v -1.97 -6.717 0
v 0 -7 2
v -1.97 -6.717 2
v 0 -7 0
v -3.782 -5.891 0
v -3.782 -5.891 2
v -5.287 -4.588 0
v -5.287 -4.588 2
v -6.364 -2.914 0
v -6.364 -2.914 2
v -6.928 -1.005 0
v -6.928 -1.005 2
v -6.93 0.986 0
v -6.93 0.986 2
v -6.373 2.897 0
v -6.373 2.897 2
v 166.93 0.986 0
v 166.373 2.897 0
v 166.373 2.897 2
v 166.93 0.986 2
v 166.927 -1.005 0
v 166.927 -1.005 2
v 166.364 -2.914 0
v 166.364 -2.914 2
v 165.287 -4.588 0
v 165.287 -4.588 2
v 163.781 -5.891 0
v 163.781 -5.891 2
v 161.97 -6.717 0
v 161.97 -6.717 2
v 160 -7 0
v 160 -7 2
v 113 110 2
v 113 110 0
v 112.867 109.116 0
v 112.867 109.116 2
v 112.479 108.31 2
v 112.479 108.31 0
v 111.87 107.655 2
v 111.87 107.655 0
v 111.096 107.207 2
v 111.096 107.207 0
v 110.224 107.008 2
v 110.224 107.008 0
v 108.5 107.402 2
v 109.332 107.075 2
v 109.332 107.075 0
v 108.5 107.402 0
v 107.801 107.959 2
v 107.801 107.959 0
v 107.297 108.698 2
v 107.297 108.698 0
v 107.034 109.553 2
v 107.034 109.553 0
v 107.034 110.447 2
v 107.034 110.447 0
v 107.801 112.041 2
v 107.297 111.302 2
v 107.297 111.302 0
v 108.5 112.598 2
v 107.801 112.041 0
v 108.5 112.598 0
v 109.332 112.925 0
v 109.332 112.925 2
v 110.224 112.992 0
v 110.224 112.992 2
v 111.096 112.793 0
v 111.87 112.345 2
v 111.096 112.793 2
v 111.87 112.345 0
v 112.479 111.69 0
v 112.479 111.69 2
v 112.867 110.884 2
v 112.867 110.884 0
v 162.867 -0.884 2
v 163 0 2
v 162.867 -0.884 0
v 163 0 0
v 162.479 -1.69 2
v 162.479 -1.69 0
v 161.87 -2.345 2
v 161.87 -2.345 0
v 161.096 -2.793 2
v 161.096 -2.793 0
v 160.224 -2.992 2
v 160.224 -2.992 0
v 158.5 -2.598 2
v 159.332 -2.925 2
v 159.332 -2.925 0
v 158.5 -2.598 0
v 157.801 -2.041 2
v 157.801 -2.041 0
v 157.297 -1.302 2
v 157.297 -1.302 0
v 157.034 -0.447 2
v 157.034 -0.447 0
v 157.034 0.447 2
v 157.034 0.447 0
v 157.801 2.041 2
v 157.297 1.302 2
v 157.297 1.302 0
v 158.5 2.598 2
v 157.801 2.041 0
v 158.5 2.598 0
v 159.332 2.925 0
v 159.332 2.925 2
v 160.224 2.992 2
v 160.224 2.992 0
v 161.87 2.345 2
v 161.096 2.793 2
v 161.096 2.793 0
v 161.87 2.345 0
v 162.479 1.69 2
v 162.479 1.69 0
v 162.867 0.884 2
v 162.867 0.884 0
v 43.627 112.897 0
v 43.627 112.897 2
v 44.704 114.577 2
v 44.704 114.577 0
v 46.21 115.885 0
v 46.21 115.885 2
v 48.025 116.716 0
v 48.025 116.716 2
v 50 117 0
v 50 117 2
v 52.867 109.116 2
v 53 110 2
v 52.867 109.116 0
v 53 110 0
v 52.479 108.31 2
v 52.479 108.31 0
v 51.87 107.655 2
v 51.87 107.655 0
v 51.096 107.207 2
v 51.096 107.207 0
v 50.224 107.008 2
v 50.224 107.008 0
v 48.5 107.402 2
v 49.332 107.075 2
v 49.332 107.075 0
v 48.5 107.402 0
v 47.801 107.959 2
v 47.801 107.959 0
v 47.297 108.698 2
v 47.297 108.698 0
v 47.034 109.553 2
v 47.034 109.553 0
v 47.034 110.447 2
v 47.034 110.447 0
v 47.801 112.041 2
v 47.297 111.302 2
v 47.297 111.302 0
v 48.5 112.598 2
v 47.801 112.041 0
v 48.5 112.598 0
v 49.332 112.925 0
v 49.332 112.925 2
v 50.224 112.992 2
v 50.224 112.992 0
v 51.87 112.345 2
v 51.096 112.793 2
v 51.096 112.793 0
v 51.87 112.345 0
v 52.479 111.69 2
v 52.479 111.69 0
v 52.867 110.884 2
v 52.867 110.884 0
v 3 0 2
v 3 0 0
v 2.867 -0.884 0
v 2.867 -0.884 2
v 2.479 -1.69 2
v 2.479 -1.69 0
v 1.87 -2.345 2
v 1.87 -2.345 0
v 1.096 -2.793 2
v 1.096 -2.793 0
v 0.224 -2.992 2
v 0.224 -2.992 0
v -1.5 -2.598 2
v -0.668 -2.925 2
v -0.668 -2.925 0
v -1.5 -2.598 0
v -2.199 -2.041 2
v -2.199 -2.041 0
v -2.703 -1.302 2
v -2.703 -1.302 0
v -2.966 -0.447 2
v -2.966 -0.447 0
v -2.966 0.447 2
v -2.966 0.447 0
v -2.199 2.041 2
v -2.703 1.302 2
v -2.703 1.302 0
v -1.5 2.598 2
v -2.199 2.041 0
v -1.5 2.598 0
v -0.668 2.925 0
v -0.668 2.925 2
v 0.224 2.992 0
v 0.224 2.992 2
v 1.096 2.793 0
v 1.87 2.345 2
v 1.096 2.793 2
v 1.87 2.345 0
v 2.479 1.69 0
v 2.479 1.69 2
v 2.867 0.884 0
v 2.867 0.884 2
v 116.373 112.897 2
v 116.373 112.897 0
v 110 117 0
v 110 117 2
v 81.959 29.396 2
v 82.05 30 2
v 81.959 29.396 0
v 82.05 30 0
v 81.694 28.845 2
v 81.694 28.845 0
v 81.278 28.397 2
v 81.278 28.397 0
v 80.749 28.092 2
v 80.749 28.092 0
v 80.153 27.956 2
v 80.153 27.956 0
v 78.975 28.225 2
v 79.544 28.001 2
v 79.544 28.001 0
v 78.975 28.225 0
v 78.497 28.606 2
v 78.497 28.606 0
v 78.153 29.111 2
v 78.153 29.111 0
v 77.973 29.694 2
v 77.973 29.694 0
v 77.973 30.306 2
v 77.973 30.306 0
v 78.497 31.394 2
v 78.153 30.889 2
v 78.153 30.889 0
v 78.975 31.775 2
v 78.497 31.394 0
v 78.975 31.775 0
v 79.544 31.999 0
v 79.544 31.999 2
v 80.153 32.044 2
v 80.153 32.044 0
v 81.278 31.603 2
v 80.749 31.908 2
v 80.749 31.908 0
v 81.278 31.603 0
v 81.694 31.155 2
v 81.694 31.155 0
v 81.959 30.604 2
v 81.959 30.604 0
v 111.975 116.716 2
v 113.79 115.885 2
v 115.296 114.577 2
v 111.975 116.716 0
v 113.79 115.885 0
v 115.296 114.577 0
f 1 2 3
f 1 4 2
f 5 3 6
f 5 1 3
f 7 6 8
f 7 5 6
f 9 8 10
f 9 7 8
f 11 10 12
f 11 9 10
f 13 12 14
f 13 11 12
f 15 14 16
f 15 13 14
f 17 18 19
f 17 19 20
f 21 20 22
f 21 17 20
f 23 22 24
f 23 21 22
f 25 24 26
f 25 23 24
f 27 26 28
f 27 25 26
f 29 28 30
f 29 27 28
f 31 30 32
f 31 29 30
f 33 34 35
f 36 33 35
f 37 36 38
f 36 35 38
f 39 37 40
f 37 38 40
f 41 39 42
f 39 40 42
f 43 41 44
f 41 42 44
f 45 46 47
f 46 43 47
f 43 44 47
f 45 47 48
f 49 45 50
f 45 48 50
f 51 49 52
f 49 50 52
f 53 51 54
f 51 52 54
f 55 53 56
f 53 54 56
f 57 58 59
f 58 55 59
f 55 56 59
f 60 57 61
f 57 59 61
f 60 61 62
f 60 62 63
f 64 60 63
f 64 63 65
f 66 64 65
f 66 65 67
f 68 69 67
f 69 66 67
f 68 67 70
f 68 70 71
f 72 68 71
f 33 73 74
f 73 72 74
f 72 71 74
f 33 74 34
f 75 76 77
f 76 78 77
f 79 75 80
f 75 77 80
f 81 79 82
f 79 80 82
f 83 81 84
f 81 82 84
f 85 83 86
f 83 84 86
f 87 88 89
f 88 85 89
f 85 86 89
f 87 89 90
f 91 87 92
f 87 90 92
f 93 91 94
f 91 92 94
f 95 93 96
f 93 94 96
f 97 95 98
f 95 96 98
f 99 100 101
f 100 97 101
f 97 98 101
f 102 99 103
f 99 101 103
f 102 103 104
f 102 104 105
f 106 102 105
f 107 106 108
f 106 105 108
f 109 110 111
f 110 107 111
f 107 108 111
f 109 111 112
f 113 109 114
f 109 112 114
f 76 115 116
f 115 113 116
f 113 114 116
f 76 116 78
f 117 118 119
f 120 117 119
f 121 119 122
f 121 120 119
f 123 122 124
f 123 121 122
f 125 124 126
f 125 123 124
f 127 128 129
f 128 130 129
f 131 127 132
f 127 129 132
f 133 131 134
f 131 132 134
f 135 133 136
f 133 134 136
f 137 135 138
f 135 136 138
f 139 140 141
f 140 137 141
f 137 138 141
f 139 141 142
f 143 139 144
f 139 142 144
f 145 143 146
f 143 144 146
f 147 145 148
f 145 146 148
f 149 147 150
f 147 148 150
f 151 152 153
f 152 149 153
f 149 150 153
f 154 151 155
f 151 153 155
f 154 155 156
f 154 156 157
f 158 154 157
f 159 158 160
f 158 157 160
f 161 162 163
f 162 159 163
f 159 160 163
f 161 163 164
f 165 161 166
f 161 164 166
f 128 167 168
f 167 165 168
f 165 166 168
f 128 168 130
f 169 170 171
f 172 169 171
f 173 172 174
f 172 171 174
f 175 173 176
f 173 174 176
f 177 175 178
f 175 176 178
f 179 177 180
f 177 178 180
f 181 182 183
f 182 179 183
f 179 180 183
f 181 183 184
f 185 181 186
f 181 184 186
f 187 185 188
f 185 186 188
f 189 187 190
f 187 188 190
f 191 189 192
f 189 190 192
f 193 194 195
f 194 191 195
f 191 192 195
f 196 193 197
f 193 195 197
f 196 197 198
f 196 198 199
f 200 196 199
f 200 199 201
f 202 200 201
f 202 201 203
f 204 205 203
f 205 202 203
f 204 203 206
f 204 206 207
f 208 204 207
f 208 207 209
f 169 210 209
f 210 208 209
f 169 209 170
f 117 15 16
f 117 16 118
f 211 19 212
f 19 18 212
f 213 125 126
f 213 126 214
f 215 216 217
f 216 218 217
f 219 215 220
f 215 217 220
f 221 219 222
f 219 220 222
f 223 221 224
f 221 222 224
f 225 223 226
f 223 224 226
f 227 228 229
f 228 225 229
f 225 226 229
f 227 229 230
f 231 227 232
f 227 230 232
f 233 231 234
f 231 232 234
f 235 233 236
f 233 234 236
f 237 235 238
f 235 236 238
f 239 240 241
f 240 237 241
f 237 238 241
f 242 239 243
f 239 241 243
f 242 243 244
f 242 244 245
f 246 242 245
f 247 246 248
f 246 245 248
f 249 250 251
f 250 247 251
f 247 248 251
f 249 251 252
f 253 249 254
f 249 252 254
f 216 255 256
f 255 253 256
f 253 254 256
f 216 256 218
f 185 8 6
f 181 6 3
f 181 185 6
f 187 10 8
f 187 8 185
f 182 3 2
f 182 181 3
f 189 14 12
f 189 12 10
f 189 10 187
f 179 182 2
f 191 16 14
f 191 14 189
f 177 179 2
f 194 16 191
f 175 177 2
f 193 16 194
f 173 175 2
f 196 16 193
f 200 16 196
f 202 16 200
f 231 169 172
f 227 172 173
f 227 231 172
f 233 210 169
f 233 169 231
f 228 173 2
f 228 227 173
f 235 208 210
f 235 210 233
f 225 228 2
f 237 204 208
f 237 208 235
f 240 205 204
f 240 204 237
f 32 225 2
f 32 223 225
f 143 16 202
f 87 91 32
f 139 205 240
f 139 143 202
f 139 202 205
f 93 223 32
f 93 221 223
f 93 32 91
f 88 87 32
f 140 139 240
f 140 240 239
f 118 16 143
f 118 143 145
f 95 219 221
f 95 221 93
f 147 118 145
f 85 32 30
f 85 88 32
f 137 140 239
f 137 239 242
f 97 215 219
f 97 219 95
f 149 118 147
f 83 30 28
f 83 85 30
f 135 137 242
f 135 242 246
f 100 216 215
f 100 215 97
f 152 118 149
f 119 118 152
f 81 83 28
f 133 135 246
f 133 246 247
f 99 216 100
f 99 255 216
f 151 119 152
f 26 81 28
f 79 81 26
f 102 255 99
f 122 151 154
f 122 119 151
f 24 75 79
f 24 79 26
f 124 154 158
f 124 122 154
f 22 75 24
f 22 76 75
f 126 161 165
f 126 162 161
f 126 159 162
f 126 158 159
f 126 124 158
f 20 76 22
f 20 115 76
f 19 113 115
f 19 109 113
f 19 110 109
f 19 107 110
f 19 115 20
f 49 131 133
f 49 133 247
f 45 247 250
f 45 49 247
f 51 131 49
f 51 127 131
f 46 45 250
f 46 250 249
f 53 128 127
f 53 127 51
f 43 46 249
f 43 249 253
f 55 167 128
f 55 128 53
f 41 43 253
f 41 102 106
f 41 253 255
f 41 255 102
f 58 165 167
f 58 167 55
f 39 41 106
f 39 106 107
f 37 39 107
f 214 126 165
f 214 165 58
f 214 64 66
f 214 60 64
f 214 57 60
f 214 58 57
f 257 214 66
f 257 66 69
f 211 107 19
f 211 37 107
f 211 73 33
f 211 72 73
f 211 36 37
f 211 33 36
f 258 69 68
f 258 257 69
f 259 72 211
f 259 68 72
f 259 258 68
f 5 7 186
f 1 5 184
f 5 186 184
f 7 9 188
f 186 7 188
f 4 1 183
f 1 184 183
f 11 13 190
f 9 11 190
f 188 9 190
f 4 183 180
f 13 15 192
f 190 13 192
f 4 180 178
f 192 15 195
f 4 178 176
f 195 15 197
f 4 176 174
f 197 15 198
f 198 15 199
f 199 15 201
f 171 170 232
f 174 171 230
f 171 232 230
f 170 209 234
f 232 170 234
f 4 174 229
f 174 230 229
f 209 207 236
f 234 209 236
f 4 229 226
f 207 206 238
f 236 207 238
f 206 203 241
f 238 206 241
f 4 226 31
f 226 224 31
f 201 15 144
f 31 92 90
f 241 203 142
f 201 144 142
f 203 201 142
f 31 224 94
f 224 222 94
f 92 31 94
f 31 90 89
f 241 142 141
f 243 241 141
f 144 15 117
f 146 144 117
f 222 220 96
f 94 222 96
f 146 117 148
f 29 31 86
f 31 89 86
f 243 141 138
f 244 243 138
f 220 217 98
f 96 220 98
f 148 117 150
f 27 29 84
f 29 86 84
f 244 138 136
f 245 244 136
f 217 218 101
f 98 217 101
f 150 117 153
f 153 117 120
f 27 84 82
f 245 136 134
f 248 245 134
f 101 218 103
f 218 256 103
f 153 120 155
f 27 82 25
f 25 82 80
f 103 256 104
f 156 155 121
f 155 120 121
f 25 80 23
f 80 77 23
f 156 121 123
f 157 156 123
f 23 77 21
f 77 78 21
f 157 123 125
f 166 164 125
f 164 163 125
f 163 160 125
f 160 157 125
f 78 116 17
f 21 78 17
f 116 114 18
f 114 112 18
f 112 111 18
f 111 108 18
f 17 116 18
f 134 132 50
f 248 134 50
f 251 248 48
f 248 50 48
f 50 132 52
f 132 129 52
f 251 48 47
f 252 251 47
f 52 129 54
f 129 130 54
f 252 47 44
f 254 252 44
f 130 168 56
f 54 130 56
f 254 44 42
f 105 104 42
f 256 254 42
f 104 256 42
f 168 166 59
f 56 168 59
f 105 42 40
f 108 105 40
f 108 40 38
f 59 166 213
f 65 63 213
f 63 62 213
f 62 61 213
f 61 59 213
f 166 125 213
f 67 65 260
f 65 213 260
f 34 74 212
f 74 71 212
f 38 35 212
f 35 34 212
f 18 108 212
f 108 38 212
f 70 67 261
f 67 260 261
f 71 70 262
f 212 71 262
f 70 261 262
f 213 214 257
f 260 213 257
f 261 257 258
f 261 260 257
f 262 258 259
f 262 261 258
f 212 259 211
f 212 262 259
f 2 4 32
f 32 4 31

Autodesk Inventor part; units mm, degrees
ref_plane "YZ Plane" through (0, 0, 0) normal (1, 0, 0) x (0, 1, 0)
ref_plane "XZ Plane" through (0, 0, 0) normal (0, 1, 0) x (-1, 0, 0)
ref_plane "XY Plane" through (0, 0, 0) normal (0, 0, 1) x (1, 0, 0)
sketch "Sketch1" plane through (0, 0, 0) normal (0, 0, 1) x (1, 0, 0)
  circle A0 centre (50, 110) radius 3
  circle A1 centre (0, 0) radius 3
  circle A2 centre (160, 0) radius 3
  circle A3 centre (80, 30) radius 2.05
  arc A4 (50, 117) -> (43.6274, 112.8966) centre (50, 110) ccw
  circle A5 centre (110, 110) radius 3
  arc A6 (116.3726, 112.8966) -> (110, 117) centre (110, 110) ccw
  arc A7 (-6.3726, 2.8966) -> (0, -7) centre (0, 0) ccw
  arc A8 (160, -7) -> (166.3726, 2.8966) centre (160, 0) ccw
  line L0 (-6.3726, 2.8966) -> (43.6274, 112.8966)
  line L1 (50, 117) -> (110, 117)
  line L2 (166.3726, 2.8966) -> (116.3726, 112.8966)
  line L3 (0, -7) -> (160, -7)
  dimension "d7" = 6
  dimension "d9" = 6
  dimension "d10" = 6
  dimension "d11" = 4.1
  dimension "d12" = 14
  dimension "d13" = 6
  dimension "d14" = 14
  dimension "d15" = 14
  dimension "d16" = 14
  dimension "d25" = 160
  dimension "d26" = 60
  dimension "d27" = 110
  dimension "d28" = 30
extrude "Extrusion1" add sketch "Sketch1" along normal blind 2
properties part number "Frame" material "Steel, Mild"
